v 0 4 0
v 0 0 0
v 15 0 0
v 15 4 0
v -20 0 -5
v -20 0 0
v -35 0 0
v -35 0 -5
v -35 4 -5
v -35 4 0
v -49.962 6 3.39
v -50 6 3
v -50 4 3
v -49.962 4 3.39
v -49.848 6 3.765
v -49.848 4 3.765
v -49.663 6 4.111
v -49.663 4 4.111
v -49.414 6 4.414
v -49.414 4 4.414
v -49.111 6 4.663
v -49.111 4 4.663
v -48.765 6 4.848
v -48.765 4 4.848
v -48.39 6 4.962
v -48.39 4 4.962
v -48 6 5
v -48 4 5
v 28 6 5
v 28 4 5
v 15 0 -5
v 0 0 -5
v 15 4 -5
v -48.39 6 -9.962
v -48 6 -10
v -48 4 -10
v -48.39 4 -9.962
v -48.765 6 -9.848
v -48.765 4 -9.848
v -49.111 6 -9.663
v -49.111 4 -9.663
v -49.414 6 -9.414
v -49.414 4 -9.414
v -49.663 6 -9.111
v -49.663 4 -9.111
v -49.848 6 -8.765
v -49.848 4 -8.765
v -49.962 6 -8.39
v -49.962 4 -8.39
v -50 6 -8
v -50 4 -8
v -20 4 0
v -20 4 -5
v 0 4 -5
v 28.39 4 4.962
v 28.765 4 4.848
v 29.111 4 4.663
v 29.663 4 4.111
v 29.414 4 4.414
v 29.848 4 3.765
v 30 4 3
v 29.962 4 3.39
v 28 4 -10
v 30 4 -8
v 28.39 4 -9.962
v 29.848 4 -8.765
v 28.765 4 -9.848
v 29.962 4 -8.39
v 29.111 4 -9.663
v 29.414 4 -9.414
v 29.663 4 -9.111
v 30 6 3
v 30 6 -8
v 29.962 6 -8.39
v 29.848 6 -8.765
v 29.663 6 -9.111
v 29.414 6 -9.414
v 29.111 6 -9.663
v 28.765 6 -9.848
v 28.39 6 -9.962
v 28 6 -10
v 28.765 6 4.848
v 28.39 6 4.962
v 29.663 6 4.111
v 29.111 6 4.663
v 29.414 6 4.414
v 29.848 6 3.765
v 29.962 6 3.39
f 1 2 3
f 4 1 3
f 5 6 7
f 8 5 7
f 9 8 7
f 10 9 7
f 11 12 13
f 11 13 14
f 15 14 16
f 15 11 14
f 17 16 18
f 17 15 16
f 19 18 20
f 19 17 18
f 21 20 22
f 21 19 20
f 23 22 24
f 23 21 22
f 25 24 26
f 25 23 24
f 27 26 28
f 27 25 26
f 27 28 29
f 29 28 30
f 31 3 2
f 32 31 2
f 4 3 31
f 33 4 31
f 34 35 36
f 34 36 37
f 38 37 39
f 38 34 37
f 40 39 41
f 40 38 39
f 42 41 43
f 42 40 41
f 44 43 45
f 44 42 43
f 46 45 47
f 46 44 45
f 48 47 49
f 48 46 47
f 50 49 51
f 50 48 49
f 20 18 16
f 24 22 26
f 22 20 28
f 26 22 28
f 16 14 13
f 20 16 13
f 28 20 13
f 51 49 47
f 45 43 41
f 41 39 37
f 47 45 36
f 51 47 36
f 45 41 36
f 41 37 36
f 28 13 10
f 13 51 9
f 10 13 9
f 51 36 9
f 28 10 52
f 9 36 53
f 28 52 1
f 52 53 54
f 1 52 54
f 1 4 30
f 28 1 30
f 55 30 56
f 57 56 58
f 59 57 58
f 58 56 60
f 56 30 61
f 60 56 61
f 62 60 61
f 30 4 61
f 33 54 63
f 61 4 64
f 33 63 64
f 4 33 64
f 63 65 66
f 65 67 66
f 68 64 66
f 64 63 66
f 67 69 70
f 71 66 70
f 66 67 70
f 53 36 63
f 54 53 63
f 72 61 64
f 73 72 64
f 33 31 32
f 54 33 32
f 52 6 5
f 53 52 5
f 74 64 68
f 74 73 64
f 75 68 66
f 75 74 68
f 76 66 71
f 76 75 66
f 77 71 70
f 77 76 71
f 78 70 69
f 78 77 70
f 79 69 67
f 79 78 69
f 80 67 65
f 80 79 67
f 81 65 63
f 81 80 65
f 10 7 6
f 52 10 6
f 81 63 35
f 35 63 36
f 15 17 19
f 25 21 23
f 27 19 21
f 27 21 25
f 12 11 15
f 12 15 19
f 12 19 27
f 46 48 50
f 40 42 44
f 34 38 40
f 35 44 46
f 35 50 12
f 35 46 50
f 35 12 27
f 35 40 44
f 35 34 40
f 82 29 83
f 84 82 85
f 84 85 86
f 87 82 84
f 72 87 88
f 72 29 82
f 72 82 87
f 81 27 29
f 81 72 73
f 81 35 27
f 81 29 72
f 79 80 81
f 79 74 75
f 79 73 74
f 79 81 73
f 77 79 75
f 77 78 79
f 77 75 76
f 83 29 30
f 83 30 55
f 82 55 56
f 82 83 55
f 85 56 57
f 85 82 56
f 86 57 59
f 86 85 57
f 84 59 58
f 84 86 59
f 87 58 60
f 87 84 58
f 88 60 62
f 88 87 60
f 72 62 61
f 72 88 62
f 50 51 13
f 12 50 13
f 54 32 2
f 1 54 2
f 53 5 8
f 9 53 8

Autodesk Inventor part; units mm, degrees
ref_plane "YZ Plane" through (0, 0, 0) normal (1, 0, 0) x (0, 1, 0)
ref_plane "XZ Plane" through (0, 0, 0) normal (0, 1, 0) x (-1, 0, 0)
ref_plane "XY Plane" through (0, 0, 0) normal (0, 0, 1) x (1, 0, 0)
sketch "Эскиз1" plane through (0, 0, 0) normal (0, 1, 0) x (-1, 0, 0)
  line L0 (0, 0) -> (-15, 0)
  line L1 (-15, 0) -> (-15, -5)
  line L2 (-15, -5) -> (0, -5)
  line L3 (0, -5) -> (0, 0)
  dimension "d0" = 5
  dimension "d1" = 15
extrude "Выдавливание1" add sketch "Эскиз1" along normal blind 4
sketch "Эскиз2" plane through (0, 4, 0) normal (0, 1, 0) x (1, 0, 0)
  line L0 (-10, -5) -> (30, -5)
  line L1 (30, -5) -> (30, 10)
  line L2 (30, 10) -> (-10, 10)
  line L3 (-10, 10) -> (-10, -5)
  line L4 (-10, 2.5) -> (-4.0843, 2.5)
  line L5 (0, 5) -> (0, 0) projected
  line L6 (0, 2.5) -> (15, 2.5)
  line L7 (15, 0) -> (15, 5) projected
  dimension "d4" = 10
  dimension "d5" = 5
  dimension "d6" = 15
extrude "Выдавливание2" add sketch "Эскиз2" along normal blind 2
fillet "Сопряжение1" radius 2 2 edges at (30, 5, 5) (30, 5, -10)
mirror "Зеркальное отражение1" about plane through (-10, 4, -10) normal (-1, 0, 0)
properties part number "верхняя защелка башни"
